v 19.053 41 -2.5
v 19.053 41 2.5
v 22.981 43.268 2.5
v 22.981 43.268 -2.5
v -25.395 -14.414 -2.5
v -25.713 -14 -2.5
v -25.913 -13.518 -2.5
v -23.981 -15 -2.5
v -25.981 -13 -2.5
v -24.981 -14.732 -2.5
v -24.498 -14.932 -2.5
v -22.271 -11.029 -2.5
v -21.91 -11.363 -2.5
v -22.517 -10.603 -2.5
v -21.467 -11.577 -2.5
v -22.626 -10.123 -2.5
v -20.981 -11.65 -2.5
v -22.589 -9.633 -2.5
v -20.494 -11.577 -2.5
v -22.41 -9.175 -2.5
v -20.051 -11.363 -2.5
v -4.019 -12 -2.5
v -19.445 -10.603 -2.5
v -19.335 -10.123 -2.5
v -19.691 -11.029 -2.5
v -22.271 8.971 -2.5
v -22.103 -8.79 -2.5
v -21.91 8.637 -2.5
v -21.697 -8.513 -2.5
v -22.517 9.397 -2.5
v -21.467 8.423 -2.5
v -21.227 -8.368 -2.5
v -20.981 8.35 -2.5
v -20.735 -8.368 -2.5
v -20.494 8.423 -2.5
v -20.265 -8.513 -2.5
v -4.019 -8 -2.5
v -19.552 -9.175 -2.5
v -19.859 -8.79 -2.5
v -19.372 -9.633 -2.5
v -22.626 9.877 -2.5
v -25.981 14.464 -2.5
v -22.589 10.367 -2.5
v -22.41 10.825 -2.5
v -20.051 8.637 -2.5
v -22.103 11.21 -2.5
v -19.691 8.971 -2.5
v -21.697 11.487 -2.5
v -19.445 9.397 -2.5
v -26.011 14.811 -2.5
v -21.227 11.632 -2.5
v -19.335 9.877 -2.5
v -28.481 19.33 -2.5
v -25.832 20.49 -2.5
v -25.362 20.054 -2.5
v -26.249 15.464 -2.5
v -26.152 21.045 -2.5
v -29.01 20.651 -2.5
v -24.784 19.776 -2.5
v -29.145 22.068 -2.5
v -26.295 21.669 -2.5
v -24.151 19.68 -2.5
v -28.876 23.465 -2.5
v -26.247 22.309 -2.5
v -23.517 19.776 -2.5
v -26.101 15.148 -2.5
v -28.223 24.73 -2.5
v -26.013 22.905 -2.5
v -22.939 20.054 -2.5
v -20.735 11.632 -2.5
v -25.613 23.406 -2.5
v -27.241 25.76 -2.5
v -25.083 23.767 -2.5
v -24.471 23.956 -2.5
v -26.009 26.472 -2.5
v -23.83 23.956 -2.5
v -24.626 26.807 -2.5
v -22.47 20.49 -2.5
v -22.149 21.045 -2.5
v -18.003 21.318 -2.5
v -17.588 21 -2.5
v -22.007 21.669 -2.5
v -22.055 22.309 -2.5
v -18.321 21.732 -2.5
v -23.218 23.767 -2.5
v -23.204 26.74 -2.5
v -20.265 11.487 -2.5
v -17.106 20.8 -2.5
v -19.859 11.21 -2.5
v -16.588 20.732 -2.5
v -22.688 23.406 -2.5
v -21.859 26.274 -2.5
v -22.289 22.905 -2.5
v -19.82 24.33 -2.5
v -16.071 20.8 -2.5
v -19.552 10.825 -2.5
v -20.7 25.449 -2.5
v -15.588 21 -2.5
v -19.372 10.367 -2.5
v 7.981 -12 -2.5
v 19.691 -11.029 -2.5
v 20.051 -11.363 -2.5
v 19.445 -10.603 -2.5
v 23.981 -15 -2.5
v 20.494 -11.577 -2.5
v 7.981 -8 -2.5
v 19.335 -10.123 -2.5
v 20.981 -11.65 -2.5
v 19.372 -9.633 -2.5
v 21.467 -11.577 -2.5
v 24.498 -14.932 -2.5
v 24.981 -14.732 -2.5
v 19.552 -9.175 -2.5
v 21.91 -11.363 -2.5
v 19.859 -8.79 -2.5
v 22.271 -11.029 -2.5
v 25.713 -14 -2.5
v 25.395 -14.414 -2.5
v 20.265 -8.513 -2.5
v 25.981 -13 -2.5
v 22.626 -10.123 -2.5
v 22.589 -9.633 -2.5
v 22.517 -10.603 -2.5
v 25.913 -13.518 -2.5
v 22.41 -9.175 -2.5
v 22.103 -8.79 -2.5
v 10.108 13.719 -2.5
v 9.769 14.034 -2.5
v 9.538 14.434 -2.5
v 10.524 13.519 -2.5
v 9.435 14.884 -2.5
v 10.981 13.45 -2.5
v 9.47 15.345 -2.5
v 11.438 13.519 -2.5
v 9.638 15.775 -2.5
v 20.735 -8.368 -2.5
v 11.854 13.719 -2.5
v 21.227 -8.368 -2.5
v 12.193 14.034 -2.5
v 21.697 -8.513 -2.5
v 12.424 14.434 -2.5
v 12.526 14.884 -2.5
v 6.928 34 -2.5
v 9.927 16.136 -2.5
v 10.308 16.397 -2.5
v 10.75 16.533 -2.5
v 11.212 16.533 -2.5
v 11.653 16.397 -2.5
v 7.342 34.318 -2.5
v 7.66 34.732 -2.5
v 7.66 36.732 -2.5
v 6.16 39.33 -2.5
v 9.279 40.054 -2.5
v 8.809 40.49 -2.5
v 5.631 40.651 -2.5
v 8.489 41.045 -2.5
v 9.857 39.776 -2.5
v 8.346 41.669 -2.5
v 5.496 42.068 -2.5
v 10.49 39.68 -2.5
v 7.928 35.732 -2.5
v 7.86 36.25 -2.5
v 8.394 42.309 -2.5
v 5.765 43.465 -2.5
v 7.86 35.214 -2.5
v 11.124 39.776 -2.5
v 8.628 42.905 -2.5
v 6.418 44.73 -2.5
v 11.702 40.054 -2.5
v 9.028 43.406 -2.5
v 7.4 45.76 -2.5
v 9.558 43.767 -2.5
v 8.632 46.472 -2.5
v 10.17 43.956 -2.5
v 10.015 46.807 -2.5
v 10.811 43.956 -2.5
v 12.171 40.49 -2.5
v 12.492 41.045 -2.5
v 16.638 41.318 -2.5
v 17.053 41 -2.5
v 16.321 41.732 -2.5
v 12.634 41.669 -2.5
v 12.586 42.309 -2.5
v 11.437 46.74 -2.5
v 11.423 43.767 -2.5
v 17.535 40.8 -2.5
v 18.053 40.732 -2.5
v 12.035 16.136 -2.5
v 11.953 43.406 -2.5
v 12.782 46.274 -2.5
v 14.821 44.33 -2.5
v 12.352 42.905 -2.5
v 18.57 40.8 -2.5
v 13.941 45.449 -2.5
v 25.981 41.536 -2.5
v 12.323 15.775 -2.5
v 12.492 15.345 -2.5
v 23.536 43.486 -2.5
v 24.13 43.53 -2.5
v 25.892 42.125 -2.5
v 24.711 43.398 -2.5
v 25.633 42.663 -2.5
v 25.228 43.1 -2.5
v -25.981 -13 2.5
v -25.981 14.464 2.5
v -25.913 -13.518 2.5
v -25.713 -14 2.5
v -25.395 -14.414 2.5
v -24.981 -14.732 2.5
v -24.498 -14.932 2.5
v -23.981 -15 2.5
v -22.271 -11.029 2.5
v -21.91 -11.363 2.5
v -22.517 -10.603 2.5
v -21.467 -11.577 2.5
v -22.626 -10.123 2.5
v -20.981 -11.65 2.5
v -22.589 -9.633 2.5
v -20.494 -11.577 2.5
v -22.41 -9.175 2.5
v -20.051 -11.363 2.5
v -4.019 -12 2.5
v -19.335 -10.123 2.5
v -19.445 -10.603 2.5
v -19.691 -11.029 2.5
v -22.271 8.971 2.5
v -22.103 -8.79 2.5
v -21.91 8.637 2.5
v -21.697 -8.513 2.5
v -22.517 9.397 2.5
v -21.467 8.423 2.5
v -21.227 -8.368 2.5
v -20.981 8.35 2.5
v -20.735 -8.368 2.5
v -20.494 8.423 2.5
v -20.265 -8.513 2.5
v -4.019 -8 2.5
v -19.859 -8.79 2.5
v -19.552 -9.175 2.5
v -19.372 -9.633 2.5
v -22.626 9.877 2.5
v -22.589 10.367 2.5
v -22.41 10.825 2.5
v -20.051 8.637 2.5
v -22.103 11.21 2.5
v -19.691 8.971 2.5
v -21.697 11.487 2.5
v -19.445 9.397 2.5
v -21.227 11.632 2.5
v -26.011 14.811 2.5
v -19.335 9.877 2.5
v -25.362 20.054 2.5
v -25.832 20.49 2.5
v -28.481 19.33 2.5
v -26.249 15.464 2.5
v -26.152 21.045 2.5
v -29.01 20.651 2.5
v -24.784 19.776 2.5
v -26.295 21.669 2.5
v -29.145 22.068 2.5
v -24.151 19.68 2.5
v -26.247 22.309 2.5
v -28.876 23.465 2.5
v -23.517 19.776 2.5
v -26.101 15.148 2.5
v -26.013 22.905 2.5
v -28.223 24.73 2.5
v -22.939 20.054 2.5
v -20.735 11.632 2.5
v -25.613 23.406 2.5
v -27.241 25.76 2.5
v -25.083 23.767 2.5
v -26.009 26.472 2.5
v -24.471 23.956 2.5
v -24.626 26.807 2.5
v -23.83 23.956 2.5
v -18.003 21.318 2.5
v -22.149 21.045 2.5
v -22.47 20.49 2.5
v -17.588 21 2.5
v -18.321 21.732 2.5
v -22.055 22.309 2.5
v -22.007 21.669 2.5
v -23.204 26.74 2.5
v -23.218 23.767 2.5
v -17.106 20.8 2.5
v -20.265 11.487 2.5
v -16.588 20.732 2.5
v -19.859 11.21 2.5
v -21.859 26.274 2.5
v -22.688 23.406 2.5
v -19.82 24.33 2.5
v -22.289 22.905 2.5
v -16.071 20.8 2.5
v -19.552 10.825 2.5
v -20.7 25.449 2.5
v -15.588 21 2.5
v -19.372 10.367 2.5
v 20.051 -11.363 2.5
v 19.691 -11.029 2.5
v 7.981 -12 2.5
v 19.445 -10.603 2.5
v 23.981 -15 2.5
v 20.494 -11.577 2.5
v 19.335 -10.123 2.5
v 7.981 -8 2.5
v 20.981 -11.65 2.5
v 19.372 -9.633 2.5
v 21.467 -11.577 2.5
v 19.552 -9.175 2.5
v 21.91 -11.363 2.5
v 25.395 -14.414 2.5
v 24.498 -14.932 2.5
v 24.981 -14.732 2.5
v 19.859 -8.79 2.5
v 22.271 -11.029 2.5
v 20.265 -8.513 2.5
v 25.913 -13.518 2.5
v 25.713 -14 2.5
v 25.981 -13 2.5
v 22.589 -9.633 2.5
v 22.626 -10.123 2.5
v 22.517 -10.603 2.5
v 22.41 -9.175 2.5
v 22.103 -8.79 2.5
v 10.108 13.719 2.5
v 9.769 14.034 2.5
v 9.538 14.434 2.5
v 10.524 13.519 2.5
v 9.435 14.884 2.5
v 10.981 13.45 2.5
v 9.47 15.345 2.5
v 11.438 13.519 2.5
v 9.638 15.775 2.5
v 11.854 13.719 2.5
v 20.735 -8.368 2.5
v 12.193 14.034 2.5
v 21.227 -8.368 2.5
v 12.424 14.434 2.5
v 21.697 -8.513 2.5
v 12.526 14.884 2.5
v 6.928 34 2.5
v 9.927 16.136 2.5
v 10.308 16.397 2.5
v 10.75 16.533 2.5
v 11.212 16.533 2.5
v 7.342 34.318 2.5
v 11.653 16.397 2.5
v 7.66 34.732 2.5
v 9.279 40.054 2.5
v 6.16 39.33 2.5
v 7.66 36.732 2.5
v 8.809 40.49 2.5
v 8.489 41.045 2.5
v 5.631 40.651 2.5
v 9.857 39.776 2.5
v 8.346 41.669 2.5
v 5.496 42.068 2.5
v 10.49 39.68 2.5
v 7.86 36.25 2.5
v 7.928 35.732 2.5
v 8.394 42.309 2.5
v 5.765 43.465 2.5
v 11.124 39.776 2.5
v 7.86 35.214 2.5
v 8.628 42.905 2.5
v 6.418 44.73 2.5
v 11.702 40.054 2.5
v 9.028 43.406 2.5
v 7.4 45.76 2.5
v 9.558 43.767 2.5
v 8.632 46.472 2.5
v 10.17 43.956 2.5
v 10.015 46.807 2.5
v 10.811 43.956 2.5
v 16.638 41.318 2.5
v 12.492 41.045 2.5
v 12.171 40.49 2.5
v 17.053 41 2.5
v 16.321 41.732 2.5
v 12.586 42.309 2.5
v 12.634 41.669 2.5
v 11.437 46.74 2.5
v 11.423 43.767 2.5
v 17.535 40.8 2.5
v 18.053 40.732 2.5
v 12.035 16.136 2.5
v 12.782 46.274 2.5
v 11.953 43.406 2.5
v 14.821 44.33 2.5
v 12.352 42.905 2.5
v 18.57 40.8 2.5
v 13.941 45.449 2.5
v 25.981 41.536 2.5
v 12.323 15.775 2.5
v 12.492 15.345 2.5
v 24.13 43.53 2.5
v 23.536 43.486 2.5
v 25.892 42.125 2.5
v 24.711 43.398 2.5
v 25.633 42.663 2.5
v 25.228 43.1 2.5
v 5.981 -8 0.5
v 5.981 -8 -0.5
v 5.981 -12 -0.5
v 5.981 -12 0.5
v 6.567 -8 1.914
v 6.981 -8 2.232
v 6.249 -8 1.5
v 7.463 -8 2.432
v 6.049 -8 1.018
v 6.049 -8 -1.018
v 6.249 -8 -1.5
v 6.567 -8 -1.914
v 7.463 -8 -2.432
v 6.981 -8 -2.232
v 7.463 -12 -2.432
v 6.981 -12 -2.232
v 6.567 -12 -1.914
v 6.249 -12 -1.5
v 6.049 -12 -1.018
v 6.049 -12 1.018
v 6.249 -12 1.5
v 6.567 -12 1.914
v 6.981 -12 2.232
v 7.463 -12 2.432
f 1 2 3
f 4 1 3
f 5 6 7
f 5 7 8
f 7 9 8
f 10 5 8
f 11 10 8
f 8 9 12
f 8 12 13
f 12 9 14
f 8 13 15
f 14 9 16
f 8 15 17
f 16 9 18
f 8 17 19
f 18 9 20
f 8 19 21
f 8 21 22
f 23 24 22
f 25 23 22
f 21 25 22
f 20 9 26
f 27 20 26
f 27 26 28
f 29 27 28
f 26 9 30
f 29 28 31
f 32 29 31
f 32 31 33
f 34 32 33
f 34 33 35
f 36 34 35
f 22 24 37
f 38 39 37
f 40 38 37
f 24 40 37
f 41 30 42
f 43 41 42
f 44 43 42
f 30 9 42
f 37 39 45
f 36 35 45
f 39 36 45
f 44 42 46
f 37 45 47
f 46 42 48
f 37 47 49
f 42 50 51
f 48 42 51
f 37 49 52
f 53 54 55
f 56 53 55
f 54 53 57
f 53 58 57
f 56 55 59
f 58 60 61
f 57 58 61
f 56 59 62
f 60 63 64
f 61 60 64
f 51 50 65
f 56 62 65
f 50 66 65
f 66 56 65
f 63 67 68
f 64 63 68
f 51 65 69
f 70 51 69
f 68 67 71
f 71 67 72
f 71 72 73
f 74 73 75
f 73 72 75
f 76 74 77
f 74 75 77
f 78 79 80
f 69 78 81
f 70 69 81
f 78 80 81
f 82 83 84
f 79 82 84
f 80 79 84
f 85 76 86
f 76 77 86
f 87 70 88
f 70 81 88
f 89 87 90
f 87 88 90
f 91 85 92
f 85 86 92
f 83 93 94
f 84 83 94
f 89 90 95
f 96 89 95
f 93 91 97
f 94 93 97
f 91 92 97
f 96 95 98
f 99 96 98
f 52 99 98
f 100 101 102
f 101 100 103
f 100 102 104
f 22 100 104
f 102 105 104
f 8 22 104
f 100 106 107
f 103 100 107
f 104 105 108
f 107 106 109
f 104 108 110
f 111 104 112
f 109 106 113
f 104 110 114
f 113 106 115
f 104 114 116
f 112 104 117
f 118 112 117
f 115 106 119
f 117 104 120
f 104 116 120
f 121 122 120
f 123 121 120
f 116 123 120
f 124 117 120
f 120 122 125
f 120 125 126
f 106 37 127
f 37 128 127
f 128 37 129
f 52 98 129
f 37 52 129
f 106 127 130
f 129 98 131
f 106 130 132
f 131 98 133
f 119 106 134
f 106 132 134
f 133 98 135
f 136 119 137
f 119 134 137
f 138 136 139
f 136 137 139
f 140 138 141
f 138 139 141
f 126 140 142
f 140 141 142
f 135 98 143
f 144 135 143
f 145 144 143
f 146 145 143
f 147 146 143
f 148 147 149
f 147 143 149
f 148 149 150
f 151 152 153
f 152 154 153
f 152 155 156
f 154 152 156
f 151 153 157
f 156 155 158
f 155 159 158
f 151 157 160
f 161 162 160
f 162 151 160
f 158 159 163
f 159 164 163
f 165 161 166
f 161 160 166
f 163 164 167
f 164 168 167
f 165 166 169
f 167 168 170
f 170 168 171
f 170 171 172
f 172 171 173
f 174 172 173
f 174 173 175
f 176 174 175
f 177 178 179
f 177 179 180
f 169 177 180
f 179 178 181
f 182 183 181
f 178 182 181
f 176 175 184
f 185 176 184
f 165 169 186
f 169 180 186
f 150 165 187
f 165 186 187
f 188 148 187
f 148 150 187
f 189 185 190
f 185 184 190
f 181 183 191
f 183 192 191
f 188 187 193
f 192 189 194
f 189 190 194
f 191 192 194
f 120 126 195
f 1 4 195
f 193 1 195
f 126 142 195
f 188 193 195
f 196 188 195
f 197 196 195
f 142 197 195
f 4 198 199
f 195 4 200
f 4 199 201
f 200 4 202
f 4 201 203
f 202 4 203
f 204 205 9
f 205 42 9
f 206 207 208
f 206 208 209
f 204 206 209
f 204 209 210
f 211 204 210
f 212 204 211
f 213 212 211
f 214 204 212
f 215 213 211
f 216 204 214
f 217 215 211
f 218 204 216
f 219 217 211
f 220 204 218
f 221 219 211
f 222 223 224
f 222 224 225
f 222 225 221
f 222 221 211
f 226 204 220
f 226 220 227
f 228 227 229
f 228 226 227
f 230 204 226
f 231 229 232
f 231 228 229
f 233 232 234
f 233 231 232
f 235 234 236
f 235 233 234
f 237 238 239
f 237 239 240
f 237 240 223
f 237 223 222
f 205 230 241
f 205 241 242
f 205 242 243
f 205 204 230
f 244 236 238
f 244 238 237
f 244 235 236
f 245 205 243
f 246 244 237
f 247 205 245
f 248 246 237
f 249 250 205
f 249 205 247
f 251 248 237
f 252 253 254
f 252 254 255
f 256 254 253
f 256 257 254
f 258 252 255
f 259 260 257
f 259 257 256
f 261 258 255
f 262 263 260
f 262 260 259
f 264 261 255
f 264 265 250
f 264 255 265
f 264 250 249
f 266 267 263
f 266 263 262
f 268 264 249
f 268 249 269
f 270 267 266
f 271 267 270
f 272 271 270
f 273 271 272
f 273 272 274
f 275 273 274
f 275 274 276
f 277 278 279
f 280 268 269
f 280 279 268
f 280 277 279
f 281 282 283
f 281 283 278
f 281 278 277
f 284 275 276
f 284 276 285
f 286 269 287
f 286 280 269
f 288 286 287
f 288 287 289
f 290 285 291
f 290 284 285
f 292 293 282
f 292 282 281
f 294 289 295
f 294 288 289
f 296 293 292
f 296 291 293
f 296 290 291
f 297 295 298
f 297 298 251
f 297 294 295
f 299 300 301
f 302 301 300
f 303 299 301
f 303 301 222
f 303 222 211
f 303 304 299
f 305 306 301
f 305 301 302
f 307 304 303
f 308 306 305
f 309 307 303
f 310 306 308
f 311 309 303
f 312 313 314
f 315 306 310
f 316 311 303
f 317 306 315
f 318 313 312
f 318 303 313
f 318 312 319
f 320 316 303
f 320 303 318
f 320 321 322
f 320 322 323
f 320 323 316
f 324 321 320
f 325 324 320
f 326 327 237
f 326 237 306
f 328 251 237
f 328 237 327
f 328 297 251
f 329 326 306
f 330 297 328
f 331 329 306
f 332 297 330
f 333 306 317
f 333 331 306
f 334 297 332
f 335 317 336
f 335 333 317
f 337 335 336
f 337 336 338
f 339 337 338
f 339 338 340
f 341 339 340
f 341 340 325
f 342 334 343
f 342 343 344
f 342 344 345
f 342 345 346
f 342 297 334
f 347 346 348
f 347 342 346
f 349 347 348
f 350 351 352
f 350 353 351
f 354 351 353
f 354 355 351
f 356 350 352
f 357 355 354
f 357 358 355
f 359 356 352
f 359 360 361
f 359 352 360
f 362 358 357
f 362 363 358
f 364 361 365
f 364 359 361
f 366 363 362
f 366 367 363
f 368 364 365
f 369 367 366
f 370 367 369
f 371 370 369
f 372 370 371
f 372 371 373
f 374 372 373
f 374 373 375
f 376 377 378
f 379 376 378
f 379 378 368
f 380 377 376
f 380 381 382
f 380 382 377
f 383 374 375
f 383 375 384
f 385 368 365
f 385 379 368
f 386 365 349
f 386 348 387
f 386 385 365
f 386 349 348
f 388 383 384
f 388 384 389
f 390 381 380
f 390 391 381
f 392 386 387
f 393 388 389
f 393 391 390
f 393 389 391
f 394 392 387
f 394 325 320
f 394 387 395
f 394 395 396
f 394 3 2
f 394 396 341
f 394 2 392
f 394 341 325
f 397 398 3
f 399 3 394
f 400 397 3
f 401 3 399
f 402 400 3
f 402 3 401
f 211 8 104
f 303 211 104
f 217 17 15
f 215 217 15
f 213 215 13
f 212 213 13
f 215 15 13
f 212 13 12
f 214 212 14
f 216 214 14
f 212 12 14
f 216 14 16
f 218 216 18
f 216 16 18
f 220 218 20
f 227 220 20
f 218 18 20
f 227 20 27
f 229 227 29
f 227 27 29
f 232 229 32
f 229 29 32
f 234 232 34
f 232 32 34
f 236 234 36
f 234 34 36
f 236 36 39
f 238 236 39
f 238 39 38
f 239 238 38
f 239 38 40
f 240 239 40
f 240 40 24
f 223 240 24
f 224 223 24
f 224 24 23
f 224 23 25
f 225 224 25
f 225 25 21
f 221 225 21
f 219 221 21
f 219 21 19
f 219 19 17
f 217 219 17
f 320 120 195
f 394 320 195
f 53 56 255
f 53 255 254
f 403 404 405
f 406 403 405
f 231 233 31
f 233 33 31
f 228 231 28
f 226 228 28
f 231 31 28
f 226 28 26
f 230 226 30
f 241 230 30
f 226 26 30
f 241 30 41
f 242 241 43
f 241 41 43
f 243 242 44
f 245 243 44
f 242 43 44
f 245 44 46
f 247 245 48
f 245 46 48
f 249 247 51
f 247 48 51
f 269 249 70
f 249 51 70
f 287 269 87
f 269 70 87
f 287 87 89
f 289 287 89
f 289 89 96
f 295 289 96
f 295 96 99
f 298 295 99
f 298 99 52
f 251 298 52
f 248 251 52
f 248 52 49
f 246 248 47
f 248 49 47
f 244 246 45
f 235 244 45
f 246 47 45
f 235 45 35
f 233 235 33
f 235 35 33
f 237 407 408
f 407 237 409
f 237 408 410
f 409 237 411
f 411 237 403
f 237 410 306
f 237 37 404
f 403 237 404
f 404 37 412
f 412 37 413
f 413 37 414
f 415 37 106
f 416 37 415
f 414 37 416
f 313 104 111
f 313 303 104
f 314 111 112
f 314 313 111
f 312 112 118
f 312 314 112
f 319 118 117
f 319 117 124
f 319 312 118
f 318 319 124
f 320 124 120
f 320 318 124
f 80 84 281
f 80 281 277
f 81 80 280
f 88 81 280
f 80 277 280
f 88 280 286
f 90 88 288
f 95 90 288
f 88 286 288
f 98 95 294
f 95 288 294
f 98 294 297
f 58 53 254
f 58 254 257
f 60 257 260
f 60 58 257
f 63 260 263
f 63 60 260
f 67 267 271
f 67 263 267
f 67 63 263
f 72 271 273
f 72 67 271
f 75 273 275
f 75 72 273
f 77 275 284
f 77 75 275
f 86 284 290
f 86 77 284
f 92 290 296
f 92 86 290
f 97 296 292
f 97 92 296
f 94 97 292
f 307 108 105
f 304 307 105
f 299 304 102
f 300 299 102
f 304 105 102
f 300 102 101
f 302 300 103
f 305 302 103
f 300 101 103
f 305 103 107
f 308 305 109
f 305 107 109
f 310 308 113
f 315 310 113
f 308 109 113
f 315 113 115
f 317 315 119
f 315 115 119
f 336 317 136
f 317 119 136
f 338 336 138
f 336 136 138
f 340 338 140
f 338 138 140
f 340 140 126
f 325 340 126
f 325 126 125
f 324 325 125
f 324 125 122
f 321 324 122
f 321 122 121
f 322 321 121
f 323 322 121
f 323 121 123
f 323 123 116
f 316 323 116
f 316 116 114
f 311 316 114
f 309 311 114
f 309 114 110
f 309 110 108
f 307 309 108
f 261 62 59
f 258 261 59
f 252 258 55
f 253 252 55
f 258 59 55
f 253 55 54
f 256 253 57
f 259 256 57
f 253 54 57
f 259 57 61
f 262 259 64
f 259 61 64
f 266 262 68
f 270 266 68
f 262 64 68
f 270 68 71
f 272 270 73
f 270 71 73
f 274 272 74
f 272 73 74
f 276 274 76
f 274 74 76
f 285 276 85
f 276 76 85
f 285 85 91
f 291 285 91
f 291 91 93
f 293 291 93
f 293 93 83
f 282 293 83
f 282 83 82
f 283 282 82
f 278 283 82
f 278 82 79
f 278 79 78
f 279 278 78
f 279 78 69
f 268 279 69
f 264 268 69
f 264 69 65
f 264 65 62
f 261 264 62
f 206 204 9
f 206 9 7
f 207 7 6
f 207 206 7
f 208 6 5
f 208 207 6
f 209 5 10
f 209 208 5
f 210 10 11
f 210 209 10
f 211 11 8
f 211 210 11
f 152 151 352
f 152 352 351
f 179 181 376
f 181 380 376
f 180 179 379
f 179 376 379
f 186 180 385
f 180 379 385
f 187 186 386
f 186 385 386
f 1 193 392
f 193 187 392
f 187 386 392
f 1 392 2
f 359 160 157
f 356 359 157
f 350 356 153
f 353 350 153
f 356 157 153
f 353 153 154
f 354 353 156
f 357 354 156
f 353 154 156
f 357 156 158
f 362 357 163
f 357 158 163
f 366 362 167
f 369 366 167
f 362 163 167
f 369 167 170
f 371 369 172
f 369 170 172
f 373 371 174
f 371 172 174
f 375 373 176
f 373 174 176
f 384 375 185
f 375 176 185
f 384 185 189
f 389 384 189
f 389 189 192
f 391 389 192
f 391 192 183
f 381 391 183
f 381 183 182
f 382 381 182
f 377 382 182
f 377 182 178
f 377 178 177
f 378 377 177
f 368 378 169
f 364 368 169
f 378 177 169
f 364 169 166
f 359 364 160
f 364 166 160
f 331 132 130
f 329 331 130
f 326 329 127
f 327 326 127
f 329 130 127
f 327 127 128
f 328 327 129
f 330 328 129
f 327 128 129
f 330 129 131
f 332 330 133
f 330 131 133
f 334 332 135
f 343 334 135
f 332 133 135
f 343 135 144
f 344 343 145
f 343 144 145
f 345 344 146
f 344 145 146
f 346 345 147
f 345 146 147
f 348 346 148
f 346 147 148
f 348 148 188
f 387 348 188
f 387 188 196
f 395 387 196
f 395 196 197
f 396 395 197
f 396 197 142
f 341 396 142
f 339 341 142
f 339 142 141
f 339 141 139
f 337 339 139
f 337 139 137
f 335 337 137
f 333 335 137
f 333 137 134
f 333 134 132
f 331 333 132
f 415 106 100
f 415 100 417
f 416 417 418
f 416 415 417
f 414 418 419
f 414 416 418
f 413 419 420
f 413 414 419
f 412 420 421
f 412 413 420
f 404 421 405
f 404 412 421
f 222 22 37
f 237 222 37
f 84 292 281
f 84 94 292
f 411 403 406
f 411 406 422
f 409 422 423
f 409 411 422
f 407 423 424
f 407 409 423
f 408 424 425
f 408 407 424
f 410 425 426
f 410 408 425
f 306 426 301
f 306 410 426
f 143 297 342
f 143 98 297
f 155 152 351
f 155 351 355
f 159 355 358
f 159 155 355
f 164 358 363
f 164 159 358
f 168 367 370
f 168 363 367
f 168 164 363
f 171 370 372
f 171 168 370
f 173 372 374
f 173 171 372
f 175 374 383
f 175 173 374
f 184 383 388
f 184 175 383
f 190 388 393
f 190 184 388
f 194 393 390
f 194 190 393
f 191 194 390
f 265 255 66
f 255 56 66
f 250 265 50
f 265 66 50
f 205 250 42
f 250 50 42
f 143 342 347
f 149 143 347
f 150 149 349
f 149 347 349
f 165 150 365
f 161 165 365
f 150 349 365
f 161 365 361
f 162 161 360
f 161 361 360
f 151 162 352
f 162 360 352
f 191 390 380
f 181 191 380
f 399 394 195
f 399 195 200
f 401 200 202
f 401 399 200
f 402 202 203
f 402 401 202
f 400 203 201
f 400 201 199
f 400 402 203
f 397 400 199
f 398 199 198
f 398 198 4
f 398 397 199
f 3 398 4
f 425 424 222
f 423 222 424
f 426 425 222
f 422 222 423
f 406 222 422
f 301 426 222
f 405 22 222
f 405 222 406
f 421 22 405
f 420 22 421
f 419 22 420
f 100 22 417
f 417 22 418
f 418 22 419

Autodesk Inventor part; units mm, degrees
ref_plane "YZ Plane" through (0, 0, 0) normal (1, 0, 0) x (0, 1, 0)
ref_plane "XZ Plane" through (0, 0, 0) normal (0, 1, 0) x (-1, 0, 0)
ref_plane "XY Plane" through (0, 0, 0) normal (0, 0, 1) x (1, 0, 0)
sketch "スケッチ1" plane through (0, 0, 0) normal (0, 0, 1) x (1, 0, 0)
  line L0 (-25.9808, -15) -> (25.9808, -15)
  line L1 (25.9808, -15) -> (25.9808, 15)
  line L2 (25.9808, 15) -> (-25.9808, 15)
  line L3 (-25.9808, 15) -> (-25.9808, -15)
  line L4 (-25.9808, -15) -> (25.9808, 15) construction
  line L5 (25.9808, -15) -> (-25.9808, 15) construction
  line L6 (-25.9808, 15) -> (25.9808, 45)
  line L7 (25.9808, 45) -> (25.9808, 15)
  line L8 (-25.9808, 15) -> (-30.9808, 23.6603)
  line L9 (-30.9808, 23.6603) -> (-22.3205, 28.6603)
  line L10 (-22.3205, 28.6603) -> (-17.3205, 20)
  line L11 (8.6603, 35) -> (3.6603, 43.6603)
  line L12 (3.6603, 43.6603) -> (12.3205, 48.6603)
  line L13 (12.3205, 48.6603) -> (17.3205, 40)
  point P0 (0, 0)
  dimension "d0" = 60
  dimension "d1" = 30
  dimension "d2" = 30
  dimension "d3" = 30
  dimension "d4" = 10
  dimension "d5" = 10
  dimension "d6" = 10
  dimension "d7" = 30
extrude "押し出し1" add sketch "スケッチ1" along normal mid plane 5
sketch "スケッチ2" plane through (0, 0, 2.5) normal (0, 0, 1) x (1, 0, 0)
  line L0 (-30.9808, 23.6603) -> (-25.9808, 15) projected
  line L1 (-25.9808, 15) -> (-25.9808, -15) projected
  line L2 (-25.9808, -15) -> (25.9808, -15) projected
  line L3 (25.9808, -15) -> (25.9808, 45) projected
  line L4 (25.9808, 45) -> (17.3205, 40) projected
  line L5 (17.3205, 40) -> (12.3205, 48.6603) projected
  line L6 (12.3205, 48.6603) -> (3.6603, 43.6603) projected
  line L7 (3.6603, 43.6603) -> (8.6603, 35) projected
  line L8 (8.6603, 35) -> (-17.3205, 20) projected
  line L9 (-17.3205, 20) -> (-22.3205, 28.6603) projected
  line L10 (-22.3205, 28.6603) -> (-30.9808, 23.6603) projected
  point P0 (0, 0)
  point P1 (-24.1506, 21.8301)
  point P2 (10.4904, 41.8301)
  dimension "d10" = 5
  dimension "d11" = 5
  dimension "d12" = 5
  dimension "d13" = 5
hole "穴1" at (-24.1506, 21.8301, 2.5) at (10.4904, 41.8301, 2.5) direction (0, 0, -1) diameter 4.3 end through all
sketch "スケッチ4" plane through (0, 0, 2.5) normal (0, 0, 1) x (1, 0, 0)
  line L0 (-25.9808, -15) -> (25.9808, -15) projected
  line L1 (25.9808, -15) -> (25.9808, 45) projected
  point P0 (0, 0)
  point P1 (10.9808, 15)
  dimension "d30" = 30
  dimension "d31" = 15
hole "穴2" at (10.9808, 15, 2.5) direction (0, 0, -1) diameter 3.1 end through all
sketch "スケッチ5" plane through (0, 0, 2.5) normal (0, 0, 1) x (1, 0, 0)
  line L0 (-25.9808, 15) -> (-25.9808, -15) projected
  line L1 (-25.9808, -15) -> (25.9808, -15) projected
  line L2 (25.9808, -15) -> (25.9808, 45) projected
  point P0 (0, 0)
  point P1 (-20.9808, 10)
  point P2 (-20.9808, -10)
  point P3 (20.9808, -10)
  dimension "d39" = 5
  dimension "d40" = 5
  dimension "d41" = 5
  dimension "d42" = 20
  dimension "d43" = 5
  dimension "d44" = 5
hole "穴3" at (-20.9808, 10, 2.5) at (-20.9808, -10, 2.5) at (20.9808, -10, 2.5) direction (0, 0, -1) diameter 3.3 end through all
sketch "スケッチ7" plane through (0, 0, -2.5) normal (0, 0, -1) x (-1, 0, 0)
  line L0 (-25.9808, -15) -> (25.9808, -15) projected
  line L1 (-25.9808, 45) -> (-25.9808, -15) projected
  line L2 (-5.9808, -10) -> (4.0192, -10)
  line L3 (4.0192, -10) -> (4.0192, -12)
  line L4 (4.0192, -12) -> (-5.9808, -12)
  line L5 (-5.9808, -12) -> (-5.9808, -10)
  line L6 (-5.9808, -10) -> (4.0192, -10)
  line L7 (4.0192, -10) -> (4.0192, -8)
  line L8 (4.0192, -8) -> (-5.9808, -8)
  line L9 (-5.9808, -8) -> (-5.9808, -10)
  point P0 (0, 0)
  dimension "d52" = 5
  dimension "d53" = 20
  dimension "d54" = 5
  dimension "d55" = 10
  dimension "d56" = 2
  dimension "d57" = 2
extrude "押し出し3" cut sketch "スケッチ7" against normal blind 10
fillet "フィレット1" radius 2 2 edges at (5.9808, -10, 2.5) (5.9808, -10, -2.5)
fillet "フィレット2" radius 2 7 edges at (17.3205, 40, 0) (25.9808, 45, 0) (-17.3205, 20, 0) (8.6603, 35, 0) (-25.9808, 15, 0) (25.9808, -15, 0) (-25.9808, -15, 0)
sketch "スケッチ8" plane through (0, 0, -2.5) normal (0, 0, -1) x (-1, 0, 0)
  arc A0 (23.9808, -15) -> (25.9808, -13) centre (23.9808, -13) ccw projected
  line L0 (25.9808, -13) -> (25.9808, 14.4641) projected
  arc A1 (26.2487, 15.4641) -> (25.9808, 14.4641) centre (27.9808, 14.4641) ccw projected
  line L1 (26.2487, 15.4641) -> (30.9808, 23.6603) projected
  line L2 (30.9808, 23.6603) -> (22.3205, 28.6603) projected
  line L3 (22.3205, 28.6603) -> (18.3205, 21.7321) projected
  arc A2 (15.5885, 21) -> (18.3205, 21.7321) centre (16.5885, 22.7321) ccw projected
  line L4 (15.5885, 21) -> (-6.9282, 34) projected
  arc A3 (-7.6603, 36.7321) -> (-6.9282, 34) centre (-5.9282, 35.7321) ccw projected
  line L5 (-7.6603, 36.7321) -> (-3.6603, 43.6603) projected
  line L6 (-3.6603, 43.6603) -> (-12.3205, 48.6603) projected
  line L7 (-12.3205, 48.6603) -> (-16.3205, 41.7321) projected
  arc A4 (-19.0526, 41) -> (-16.3205, 41.7321) centre (-18.0526, 42.7321) ccw projected
  line L8 (-19.0526, 41) -> (-22.9808, 43.2679) projected
  arc A5 (-22.9808, 43.2679) -> (-25.9808, 41.5359) centre (-23.9808, 41.5359) ccw projected
  line L9 (-25.9808, 41.5359) -> (-25.9808, -13) projected
  arc A6 (-25.9808, -13) -> (-23.9808, -15) centre (-23.9808, -13) ccw projected
  line L10 (-23.9808, -15) -> (23.9808, -15) projected
  circle A7 centre (24.1506, 21.8301) radius 2.15 projected
  circle A8 centre (-10.4904, 41.8301) radius 2.15 projected
  circle A9 centre (-10.9808, 15) radius 1.55 projected
  circle A10 centre (20.9808, 10) radius 1.65 projected
  circle A11 centre (20.9808, -10) radius 1.65 projected
  circle A12 centre (-20.9808, -10) radius 1.65 projected
  line L11 (-7.9808, -8) -> (4.0192, -8) projected
  line L12 (4.0192, -8) -> (4.0192, -12) projected
  line L13 (4.0192, -12) -> (-7.9808, -12) projected
  line L14 (-7.9808, -8) -> (-7.9808, -12) projected
  circle A13 centre (-10.4904, 41.8301) radius 5
  circle A14 centre (24.1506, 21.8301) radius 5
  point P0 (0, 0)
  point P1 (19.8205, 24.3301)
  point P2 (26.6506, 26.1603)
  point P3 (28.4808, 19.3301)
  point P4 (-14.8205, 44.3301)
  point P5 (-7.9904, 46.1603)
  point P6 (-6.1603, 39.3301)
extrude "押し出し4" cut sketch "スケッチ8" against normal blind 10 contours A14 L2 L1 | L3 L2 A14 | L7 L6 A13 | L6 L5 A13
equation "\"d5\" = d4"
equation "\"d6\" = d4"
equation "\"d11\" = d10"
equation "\"d12\" = d10"
equation "\"d13\" = d10"
equation "\"d40\" = d39"
equation "\"d41\" = d39"
equation "\"d43\" = d39"
equation "\"d44\" = d39"
equation "\"d54\" = d52"
equation "\"d56\" = d57"
properties part number "ベースパーツ1"
